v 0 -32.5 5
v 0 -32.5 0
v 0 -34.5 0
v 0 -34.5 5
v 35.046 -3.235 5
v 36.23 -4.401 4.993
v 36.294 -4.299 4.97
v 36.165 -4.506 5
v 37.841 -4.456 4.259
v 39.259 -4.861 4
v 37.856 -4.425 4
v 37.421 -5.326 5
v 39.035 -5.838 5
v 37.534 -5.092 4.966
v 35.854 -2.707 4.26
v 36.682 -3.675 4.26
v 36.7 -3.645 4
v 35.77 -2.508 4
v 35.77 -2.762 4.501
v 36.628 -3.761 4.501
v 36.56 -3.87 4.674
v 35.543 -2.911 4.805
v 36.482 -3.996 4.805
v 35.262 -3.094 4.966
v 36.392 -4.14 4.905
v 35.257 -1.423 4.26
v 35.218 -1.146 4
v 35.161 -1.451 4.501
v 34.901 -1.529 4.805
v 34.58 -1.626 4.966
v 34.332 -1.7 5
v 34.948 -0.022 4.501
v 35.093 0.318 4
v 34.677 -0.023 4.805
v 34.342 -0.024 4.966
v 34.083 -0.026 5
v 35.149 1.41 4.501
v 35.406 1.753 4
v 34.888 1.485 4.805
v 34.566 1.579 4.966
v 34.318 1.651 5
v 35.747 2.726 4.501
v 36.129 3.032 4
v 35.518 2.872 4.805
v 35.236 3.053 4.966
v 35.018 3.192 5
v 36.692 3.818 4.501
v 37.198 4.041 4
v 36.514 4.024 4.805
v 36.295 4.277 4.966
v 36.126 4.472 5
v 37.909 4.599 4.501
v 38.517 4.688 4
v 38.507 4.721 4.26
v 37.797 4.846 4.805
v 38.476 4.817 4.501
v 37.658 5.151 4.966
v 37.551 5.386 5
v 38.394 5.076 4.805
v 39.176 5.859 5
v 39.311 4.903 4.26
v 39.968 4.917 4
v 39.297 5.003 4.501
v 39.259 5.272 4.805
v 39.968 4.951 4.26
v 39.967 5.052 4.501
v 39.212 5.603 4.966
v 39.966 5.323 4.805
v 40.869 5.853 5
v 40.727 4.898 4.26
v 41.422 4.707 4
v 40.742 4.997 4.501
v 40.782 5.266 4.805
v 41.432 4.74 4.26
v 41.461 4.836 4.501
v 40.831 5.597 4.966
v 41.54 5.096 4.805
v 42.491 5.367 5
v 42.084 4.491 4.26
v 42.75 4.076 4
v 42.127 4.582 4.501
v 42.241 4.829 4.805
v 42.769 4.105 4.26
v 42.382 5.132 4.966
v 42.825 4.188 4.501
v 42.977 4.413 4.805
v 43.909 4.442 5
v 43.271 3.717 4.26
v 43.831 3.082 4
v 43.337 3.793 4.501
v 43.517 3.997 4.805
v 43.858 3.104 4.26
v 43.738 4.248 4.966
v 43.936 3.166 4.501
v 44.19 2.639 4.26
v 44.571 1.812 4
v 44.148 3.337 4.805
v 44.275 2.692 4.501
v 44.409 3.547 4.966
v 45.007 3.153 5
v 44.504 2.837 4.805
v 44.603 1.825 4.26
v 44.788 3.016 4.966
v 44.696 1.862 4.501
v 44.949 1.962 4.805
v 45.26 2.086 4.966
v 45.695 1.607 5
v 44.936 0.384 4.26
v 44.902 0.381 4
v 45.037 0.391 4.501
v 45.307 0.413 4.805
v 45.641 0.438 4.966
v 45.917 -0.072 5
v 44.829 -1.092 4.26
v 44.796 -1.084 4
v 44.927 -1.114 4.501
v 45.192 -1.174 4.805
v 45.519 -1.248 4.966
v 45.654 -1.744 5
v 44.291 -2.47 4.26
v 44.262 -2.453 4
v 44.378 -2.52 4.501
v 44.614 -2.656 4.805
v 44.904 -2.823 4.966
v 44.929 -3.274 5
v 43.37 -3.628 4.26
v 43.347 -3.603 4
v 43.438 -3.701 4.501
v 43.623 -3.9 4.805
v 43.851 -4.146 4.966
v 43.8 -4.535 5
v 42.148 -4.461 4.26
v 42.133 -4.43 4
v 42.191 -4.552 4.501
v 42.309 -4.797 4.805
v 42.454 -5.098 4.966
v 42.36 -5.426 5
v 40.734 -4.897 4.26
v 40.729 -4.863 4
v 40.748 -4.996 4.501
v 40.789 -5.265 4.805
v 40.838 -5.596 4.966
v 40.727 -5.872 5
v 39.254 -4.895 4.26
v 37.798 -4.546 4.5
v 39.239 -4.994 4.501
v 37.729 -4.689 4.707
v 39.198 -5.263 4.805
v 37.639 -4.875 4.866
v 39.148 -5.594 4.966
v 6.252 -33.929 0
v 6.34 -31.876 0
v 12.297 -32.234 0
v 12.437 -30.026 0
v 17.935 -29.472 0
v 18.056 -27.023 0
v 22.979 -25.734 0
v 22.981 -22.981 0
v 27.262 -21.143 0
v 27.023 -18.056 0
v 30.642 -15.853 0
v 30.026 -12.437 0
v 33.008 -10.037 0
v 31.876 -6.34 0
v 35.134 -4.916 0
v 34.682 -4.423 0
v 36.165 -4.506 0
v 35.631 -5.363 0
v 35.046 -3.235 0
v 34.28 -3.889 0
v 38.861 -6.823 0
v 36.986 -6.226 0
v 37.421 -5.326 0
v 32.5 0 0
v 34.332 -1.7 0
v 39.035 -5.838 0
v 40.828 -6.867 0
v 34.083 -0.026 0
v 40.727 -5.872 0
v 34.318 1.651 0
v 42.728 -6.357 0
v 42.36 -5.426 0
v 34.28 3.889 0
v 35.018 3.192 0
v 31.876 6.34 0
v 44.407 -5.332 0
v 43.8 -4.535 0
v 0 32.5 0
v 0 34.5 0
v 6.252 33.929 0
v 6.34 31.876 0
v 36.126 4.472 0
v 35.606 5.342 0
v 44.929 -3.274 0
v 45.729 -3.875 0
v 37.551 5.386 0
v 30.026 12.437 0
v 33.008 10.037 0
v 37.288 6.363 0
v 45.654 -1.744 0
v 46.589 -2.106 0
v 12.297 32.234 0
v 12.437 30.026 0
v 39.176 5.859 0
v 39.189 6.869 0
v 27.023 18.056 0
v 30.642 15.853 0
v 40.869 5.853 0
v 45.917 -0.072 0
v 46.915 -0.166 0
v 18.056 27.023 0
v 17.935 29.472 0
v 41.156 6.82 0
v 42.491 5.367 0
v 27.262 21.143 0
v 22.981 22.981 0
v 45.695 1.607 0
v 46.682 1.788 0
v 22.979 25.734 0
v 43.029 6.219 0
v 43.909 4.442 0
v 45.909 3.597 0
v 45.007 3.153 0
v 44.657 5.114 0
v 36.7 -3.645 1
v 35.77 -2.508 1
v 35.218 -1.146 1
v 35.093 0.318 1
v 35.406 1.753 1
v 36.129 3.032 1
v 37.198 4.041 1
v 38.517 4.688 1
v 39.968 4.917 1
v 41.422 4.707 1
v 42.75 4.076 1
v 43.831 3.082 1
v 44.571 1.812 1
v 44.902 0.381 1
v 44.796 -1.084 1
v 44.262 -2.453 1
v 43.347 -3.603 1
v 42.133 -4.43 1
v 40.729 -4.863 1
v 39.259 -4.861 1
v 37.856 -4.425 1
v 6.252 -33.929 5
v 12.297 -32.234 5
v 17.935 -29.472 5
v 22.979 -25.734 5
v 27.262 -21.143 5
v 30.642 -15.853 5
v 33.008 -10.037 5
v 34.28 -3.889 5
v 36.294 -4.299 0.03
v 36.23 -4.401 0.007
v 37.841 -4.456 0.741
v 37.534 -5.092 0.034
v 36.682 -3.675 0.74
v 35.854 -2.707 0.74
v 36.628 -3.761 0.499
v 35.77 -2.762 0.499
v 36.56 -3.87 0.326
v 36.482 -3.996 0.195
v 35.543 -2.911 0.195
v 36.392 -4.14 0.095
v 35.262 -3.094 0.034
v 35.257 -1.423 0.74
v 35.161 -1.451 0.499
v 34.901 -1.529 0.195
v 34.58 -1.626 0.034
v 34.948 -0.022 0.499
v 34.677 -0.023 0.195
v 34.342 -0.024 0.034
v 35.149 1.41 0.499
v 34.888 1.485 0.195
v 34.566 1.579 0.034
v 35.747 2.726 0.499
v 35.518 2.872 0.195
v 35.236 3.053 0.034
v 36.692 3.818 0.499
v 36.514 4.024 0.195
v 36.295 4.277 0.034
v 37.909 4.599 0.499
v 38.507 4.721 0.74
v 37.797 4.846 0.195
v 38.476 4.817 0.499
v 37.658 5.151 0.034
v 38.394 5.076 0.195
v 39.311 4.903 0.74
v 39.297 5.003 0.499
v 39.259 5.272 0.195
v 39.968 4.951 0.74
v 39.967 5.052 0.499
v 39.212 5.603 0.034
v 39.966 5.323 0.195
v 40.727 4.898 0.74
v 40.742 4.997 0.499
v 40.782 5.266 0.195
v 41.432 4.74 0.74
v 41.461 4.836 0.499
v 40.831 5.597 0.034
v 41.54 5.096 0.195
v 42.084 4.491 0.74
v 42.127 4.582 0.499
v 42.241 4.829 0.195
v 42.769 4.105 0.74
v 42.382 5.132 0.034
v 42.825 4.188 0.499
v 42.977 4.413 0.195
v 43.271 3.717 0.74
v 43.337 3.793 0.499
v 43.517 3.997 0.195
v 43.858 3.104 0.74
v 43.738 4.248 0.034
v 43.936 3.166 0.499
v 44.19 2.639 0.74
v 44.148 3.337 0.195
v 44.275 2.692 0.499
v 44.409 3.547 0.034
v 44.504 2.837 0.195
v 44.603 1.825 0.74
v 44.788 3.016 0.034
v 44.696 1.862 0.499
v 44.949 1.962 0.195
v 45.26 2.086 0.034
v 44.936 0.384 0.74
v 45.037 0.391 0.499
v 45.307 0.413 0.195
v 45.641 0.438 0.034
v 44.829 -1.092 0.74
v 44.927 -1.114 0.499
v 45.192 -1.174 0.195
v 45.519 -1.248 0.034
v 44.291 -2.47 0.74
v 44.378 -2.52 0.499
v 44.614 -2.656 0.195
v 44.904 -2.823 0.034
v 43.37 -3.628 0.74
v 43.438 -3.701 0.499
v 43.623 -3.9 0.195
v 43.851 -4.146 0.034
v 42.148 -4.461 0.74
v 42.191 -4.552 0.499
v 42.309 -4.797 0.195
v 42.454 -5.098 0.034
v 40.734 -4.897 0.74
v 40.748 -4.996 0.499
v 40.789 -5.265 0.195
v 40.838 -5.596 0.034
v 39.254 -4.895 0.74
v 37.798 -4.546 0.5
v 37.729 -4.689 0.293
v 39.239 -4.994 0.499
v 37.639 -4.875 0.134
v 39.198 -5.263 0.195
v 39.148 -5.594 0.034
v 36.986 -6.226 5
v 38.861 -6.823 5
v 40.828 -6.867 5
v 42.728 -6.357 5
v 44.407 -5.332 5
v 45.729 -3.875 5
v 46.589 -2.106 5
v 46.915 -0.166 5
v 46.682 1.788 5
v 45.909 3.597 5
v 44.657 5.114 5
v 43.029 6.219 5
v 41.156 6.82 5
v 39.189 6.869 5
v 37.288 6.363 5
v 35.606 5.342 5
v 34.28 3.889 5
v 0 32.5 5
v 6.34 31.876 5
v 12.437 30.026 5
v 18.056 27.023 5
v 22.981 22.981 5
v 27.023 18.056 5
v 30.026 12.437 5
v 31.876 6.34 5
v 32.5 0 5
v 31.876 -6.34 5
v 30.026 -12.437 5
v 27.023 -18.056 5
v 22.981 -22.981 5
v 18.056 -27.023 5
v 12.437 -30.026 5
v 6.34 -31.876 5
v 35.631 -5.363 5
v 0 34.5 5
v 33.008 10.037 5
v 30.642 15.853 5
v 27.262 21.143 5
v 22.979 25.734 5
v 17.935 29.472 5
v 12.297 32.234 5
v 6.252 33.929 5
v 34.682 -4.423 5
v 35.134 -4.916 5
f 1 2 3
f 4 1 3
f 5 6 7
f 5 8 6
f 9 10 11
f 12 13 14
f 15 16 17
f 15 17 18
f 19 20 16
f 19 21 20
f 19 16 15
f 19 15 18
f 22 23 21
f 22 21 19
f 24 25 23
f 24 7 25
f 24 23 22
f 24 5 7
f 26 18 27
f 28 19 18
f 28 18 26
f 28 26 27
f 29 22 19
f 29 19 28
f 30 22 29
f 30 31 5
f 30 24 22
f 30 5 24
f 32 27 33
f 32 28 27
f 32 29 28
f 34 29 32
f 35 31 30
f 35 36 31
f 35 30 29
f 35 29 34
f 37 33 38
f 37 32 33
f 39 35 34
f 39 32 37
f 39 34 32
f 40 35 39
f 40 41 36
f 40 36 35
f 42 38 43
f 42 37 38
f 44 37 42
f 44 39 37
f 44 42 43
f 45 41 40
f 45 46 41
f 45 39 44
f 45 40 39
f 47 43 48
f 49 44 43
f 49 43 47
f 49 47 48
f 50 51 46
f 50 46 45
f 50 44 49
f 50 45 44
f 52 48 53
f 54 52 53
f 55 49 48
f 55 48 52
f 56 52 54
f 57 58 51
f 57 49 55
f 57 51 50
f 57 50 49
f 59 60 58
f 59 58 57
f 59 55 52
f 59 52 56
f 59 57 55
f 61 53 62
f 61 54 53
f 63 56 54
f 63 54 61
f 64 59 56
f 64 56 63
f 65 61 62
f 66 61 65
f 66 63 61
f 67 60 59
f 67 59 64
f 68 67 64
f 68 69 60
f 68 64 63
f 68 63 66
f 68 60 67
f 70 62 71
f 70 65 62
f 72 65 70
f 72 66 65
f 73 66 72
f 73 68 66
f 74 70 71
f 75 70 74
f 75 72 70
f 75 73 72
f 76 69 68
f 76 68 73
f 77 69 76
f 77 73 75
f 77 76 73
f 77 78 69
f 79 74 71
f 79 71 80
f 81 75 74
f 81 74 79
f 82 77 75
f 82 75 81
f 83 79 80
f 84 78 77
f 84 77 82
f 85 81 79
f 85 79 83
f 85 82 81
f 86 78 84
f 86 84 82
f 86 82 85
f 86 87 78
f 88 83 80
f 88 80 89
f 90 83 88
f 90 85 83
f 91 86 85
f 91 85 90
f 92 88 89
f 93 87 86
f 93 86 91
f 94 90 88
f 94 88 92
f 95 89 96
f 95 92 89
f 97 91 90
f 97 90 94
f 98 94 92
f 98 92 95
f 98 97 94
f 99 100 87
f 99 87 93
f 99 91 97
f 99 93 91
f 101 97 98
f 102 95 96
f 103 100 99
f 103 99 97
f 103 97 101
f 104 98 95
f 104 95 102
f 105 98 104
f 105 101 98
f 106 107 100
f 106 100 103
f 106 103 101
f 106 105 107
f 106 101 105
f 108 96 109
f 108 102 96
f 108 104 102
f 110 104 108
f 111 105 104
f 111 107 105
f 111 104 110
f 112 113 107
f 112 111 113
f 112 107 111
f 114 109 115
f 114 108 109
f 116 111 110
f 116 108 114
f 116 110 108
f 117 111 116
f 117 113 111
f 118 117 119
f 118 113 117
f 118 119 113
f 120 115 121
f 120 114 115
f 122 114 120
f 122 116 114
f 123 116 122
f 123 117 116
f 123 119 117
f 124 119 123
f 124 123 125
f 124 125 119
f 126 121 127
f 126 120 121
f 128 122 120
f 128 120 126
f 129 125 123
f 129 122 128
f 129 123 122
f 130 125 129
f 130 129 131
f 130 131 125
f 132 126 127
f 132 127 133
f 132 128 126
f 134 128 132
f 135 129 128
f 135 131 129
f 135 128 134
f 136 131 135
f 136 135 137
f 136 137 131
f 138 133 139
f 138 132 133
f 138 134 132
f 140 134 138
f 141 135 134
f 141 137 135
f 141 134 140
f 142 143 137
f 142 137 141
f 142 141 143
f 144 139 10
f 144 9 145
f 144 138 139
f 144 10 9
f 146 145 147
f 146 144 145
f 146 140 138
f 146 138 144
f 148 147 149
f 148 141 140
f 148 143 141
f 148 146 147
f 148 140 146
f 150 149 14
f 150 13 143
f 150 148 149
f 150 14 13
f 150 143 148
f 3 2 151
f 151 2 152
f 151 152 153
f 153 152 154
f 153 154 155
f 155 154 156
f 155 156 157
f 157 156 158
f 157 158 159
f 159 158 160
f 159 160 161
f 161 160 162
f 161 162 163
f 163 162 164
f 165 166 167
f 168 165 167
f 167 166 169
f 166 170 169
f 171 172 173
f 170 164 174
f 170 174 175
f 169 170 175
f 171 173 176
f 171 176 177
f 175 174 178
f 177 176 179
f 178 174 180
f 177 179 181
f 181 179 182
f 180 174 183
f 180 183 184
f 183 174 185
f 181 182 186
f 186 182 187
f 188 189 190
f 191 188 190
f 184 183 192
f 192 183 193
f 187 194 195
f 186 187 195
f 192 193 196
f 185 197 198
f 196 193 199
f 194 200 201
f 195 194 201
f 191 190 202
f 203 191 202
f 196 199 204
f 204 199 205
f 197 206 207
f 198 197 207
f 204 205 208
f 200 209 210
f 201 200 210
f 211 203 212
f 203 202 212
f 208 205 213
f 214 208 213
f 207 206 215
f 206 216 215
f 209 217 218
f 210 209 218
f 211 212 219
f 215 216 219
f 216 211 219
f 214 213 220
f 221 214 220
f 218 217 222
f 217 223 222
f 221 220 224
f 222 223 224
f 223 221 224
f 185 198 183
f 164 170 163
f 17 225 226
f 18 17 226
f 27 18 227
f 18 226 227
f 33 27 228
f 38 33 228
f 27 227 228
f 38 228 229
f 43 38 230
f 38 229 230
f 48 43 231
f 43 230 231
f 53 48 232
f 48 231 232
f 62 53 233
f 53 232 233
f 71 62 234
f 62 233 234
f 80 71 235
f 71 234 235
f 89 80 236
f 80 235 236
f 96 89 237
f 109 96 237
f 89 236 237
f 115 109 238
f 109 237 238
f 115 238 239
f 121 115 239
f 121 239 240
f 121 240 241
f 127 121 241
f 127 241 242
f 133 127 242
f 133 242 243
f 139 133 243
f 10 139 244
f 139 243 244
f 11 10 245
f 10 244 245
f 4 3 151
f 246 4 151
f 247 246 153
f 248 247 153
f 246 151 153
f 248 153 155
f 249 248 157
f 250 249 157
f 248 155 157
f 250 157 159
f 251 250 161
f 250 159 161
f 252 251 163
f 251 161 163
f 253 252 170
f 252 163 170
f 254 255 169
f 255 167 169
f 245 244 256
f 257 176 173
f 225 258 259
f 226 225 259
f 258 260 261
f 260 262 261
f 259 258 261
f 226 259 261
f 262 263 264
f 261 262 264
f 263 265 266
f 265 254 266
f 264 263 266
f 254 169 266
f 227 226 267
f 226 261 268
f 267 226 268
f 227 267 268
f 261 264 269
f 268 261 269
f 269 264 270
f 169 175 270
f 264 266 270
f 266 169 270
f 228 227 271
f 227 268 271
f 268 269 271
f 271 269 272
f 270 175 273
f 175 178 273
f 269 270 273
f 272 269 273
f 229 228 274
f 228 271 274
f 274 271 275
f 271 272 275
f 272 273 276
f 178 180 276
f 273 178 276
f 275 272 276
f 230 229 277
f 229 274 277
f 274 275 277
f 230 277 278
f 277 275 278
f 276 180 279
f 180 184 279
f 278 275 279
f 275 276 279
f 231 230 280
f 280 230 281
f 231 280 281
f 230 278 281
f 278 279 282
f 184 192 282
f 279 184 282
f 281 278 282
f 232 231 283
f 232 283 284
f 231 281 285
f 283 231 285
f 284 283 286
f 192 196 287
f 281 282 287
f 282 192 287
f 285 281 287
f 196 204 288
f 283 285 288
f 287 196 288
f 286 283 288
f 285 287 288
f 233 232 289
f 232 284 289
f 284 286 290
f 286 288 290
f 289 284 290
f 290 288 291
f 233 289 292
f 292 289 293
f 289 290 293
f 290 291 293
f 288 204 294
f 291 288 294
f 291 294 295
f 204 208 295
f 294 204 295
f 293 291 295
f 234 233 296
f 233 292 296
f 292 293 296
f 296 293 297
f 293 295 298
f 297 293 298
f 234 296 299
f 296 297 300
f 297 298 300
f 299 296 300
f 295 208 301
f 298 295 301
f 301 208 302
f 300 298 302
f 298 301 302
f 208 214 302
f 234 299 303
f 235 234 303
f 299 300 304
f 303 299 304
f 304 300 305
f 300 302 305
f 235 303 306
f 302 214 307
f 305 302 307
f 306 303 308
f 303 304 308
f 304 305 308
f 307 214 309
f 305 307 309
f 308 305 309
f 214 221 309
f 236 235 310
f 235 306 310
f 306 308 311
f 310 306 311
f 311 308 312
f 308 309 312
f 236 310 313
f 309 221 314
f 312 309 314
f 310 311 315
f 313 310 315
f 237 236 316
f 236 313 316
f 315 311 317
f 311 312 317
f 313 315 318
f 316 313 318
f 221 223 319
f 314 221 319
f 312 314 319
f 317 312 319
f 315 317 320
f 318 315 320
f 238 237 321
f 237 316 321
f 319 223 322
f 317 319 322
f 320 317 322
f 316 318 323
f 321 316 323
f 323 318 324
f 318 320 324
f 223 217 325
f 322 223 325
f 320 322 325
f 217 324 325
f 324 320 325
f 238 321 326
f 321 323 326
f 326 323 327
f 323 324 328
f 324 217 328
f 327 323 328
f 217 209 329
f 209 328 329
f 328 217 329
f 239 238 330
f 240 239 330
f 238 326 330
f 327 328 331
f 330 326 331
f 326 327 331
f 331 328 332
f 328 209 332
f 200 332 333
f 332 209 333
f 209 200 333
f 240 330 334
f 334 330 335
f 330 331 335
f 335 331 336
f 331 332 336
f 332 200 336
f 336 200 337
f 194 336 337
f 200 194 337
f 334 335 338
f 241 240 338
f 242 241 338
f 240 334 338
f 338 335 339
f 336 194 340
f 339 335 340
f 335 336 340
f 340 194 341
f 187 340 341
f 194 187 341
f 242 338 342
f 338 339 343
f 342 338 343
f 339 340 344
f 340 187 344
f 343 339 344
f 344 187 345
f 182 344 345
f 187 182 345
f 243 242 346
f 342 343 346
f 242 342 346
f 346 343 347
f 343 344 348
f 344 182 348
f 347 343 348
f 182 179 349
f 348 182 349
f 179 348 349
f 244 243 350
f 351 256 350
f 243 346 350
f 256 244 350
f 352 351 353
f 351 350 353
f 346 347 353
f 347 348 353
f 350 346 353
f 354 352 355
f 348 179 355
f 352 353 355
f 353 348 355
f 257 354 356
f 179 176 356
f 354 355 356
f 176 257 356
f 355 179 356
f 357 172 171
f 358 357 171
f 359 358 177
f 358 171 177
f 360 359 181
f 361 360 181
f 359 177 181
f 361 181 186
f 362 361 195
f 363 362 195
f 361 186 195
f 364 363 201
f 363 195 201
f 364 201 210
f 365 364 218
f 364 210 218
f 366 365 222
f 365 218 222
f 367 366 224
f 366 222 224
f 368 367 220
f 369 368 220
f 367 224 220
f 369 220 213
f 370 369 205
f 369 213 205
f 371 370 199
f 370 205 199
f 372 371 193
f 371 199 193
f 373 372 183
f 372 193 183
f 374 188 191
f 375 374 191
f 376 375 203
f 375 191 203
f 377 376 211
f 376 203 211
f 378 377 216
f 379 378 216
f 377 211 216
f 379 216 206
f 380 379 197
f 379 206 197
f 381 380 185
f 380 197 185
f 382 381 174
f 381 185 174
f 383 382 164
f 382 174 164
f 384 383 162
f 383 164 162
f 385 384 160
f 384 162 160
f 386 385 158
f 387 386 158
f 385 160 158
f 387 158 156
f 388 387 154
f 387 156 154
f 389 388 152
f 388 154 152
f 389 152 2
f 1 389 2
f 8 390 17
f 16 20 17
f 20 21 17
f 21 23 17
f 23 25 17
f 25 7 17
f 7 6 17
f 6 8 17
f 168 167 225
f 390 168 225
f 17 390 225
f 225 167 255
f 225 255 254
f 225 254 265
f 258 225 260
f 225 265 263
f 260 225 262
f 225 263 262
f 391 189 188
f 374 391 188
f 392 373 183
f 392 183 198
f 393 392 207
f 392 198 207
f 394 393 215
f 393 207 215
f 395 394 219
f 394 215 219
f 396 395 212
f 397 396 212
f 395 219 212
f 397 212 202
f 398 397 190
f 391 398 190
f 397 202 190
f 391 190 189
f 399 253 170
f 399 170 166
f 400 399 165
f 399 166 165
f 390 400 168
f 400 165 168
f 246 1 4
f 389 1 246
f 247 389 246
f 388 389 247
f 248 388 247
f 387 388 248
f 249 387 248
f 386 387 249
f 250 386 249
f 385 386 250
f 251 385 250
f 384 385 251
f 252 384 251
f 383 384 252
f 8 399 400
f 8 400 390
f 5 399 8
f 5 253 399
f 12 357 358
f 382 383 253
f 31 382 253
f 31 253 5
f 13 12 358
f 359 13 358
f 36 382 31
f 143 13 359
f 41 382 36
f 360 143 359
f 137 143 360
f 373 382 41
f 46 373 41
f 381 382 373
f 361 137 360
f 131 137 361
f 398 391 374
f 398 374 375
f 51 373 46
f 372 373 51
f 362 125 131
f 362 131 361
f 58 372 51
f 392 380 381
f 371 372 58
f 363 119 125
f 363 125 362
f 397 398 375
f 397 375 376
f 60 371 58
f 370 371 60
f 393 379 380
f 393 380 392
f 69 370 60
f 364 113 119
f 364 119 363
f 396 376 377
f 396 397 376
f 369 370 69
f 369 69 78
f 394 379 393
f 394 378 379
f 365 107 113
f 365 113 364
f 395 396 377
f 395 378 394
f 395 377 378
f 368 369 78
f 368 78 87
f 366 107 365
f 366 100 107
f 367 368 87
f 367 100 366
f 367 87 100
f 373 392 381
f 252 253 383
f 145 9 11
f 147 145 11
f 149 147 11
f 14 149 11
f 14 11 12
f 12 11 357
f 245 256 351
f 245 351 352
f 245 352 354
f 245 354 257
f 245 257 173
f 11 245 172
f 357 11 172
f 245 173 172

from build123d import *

# Parameters (mm, degrees)
F1_DEPTH = 5
F3_DEPTH = 5
F4_R     = 1


with BuildPart() as f1:
    # F0 (on Top) → F1 (new body)
    with BuildSketch(Plane.XY):
        with BuildLine():
            Line((0, 34.5), (0, 32.5))
            ThreePointArc((0, 32.5), (32.5, 0), (0, -32.5))
            Line((0, -32.5), (0, -34.5))
            ThreePointArc((0, -34.5), (34.5, 0), (0, 34.5))
        make_face()
    extrude(amount=F1_DEPTH)

    # F2 (on Top) → F3 (join)
    with BuildSketch(Plane.XY):
        with BuildLine():
            Line((37.856134, -4.425073), (36.986309, -6.22602))
            ThreePointArc((36.986309, -6.22602), (43.716406, 5.833865), (35.63118, -5.362748))
            Line((35.63118, -5.362748), (36.70016, -3.645338))
            ThreePointArc((36.70016, -3.645338), (42.749633, 4.07639), (37.856134, -4.425073))
        make_face()
    extrude(amount=F3_DEPTH)

    # F4
    f4_edges = [f1.edges().sort_by_distance(p)[0] for p in [
        (42.749633, 4.07639, 0),
        (42.749633, 4.07639, 5),
    ]]
    fillet(f4_edges, radius=F4_R)


solid = f1.part
